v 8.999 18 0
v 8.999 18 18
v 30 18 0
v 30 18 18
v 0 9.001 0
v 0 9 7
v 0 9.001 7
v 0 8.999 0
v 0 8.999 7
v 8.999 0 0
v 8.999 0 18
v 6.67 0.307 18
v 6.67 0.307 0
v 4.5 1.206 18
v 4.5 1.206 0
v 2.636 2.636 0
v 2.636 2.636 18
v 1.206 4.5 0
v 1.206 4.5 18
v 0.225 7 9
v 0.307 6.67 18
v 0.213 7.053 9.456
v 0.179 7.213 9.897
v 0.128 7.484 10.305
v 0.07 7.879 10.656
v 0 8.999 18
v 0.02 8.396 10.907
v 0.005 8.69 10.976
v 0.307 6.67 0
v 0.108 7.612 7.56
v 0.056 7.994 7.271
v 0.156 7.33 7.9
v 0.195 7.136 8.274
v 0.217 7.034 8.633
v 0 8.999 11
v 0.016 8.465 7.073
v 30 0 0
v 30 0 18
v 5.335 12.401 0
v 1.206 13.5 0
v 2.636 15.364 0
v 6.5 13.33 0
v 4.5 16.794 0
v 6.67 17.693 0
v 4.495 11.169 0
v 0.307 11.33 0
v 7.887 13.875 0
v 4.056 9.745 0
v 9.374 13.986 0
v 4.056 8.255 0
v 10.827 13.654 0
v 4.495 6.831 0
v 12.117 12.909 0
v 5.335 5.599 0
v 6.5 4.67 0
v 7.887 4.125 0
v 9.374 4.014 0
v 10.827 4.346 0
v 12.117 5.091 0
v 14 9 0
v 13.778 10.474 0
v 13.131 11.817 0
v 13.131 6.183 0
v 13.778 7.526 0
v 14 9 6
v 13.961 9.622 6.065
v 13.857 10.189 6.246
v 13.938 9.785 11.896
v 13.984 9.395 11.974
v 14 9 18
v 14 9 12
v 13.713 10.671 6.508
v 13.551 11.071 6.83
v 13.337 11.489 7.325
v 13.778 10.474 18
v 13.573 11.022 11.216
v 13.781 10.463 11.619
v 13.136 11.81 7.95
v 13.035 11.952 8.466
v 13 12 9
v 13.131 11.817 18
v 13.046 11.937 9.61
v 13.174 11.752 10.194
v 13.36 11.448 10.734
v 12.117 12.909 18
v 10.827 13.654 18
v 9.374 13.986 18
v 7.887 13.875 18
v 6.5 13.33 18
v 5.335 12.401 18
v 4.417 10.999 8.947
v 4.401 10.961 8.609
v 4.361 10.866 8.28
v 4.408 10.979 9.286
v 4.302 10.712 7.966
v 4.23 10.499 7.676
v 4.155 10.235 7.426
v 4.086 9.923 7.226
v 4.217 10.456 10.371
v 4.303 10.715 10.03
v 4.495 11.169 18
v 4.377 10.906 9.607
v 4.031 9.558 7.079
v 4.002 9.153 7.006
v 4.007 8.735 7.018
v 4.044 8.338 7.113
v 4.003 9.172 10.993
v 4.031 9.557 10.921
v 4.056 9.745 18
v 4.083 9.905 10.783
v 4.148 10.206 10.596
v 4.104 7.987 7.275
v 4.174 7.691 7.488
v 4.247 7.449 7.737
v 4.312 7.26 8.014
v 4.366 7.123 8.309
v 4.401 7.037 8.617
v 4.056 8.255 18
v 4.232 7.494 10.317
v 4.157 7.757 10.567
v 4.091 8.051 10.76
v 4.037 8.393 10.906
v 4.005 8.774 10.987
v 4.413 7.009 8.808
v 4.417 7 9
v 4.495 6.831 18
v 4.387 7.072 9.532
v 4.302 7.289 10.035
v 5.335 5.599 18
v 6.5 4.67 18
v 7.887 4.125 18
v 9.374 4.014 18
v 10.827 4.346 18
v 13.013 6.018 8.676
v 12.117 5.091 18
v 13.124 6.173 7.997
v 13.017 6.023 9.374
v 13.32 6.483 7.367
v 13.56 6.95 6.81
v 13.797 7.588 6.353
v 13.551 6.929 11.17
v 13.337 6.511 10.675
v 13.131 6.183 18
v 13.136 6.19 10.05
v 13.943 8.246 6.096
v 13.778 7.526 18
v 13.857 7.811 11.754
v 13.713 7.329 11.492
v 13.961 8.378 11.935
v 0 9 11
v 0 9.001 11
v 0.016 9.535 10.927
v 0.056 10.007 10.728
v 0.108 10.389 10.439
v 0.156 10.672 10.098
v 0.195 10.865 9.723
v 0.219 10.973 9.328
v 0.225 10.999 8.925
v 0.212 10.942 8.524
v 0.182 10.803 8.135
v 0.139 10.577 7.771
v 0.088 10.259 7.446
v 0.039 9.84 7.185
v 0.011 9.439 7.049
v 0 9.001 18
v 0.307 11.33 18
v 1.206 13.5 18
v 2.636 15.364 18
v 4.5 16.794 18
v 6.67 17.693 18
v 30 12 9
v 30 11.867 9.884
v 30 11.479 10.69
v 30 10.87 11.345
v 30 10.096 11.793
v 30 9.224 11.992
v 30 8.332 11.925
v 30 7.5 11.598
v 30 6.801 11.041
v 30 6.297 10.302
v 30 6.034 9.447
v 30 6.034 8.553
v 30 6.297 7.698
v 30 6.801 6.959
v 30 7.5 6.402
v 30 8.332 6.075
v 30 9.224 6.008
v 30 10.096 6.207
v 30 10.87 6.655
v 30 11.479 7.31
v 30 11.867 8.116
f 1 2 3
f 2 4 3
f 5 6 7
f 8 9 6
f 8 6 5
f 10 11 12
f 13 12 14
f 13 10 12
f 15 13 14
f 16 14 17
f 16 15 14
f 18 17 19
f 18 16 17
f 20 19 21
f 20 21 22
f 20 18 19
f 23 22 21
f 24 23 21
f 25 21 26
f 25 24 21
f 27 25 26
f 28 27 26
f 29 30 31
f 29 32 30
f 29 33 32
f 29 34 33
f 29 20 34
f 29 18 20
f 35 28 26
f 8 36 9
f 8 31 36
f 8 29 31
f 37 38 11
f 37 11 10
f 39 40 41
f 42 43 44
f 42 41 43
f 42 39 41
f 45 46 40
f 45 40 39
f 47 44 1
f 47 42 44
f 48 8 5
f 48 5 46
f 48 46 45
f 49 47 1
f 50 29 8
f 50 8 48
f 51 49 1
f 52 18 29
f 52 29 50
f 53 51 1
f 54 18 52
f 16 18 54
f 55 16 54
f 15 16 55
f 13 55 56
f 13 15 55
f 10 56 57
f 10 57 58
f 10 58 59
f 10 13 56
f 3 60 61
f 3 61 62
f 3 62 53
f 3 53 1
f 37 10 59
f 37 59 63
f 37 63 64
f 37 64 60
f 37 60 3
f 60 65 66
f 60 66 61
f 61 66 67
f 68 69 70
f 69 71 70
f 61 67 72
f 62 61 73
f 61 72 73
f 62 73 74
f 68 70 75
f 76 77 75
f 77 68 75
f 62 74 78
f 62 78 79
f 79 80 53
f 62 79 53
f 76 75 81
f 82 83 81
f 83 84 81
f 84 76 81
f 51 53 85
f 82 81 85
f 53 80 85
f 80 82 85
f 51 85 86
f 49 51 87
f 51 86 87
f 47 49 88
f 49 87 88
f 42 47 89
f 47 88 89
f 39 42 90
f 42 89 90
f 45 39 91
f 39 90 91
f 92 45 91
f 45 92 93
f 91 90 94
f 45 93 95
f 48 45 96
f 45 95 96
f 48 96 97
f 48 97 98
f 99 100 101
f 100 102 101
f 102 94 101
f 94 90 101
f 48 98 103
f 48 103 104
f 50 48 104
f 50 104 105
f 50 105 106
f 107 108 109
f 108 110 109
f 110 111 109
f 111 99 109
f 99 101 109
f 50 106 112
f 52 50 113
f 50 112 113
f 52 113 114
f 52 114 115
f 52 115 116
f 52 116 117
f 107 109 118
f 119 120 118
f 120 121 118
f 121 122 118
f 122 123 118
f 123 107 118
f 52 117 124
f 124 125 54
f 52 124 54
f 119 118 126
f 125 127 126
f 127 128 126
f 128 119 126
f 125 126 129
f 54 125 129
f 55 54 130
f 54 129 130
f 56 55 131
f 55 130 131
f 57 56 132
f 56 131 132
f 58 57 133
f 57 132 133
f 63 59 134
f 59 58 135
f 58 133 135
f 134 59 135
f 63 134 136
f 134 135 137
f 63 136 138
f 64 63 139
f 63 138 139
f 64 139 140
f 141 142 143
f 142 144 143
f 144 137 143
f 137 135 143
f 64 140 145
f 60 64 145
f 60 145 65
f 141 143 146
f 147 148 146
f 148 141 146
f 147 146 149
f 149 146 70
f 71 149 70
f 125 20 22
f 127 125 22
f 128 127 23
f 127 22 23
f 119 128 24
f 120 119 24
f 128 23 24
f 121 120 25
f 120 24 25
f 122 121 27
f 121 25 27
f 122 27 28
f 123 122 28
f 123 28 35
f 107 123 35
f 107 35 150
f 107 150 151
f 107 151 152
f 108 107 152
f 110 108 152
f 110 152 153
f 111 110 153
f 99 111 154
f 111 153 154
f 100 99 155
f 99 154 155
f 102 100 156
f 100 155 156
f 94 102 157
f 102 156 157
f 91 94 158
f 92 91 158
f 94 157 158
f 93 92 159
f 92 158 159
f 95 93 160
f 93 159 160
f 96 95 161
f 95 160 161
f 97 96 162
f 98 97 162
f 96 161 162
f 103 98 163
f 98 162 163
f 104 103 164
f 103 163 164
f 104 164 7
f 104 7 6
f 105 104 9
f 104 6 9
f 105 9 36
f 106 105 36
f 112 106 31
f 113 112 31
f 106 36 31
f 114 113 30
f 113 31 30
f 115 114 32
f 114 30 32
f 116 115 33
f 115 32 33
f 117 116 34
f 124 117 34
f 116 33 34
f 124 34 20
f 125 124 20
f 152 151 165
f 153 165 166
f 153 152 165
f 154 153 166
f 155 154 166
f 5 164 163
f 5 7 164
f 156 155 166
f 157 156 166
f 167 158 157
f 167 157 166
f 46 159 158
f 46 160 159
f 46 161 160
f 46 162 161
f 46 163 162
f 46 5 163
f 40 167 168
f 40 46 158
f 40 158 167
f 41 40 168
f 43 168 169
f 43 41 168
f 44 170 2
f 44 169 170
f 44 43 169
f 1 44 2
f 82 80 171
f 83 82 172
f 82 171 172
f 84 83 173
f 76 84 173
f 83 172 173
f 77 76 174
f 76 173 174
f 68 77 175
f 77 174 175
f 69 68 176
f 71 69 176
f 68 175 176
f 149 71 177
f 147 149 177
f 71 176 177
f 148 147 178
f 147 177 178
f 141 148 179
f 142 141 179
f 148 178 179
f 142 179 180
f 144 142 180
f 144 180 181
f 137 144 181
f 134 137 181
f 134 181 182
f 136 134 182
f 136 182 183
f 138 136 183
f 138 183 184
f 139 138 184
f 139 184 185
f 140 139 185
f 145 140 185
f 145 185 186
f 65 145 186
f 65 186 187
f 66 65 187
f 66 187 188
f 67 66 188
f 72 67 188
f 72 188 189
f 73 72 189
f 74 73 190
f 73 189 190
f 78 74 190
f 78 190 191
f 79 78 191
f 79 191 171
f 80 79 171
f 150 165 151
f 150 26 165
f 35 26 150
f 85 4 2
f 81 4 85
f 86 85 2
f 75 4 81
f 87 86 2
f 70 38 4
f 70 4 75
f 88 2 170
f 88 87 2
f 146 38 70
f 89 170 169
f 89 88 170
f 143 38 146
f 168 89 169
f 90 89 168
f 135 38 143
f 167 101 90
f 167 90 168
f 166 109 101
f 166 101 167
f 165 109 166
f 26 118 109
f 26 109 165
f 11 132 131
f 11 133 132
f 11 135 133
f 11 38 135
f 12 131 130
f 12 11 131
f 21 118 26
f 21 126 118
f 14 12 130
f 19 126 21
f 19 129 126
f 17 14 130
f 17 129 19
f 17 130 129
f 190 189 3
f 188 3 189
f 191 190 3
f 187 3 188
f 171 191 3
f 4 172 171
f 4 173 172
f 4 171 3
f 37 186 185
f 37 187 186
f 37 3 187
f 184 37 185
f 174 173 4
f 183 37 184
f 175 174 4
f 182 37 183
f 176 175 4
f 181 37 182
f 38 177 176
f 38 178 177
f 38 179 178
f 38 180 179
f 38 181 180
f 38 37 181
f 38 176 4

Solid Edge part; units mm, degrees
sketch "Sketch1" plane through (0, 0, 0) normal (0, -1, 0) x (1, 0, 0)
  line L0 (30, 18) -> (0, 18)
  line L1 (0, 18) -> (0, 0)
  line L2 (0, 0) -> (30, 0)
  line L3 (30, 0) -> (30, 18)
extrude "Protrusion1" add sketch "Sketch1" against normal blind 18
sketch "Sketch2" plane through (15, 9, 18) normal (0, 0, 1) x (1, 0, 0)
  circle A0 centre (-6, 0) radius 5
extrude "Recorte_Extrudado_1" cut sketch "Sketch2" against normal blind 18
fillet "Redondo_1" radius 9 2 edges at (0, 18, 9) (0, 0, 9)
extrude "Cutout1" [suppressed]
sketch "Sketch3" plane through (30, 9, 9) normal (1, 0, 0) x (0, 1, 0)
  circle A0 centre (0, 0) radius 3
extrude "Recorte_Extrudado_3" cut sketch "Sketch3" against normal blind 21
sketch "Sketch4" plane through (0, 0, 0) normal (-1, 0, 0) x (0, -1, 0)
  circle A0 centre (-9, 9) radius 2
extrude "Recorte_Extrudado_4" cut sketch "Sketch4" against normal blind 7
